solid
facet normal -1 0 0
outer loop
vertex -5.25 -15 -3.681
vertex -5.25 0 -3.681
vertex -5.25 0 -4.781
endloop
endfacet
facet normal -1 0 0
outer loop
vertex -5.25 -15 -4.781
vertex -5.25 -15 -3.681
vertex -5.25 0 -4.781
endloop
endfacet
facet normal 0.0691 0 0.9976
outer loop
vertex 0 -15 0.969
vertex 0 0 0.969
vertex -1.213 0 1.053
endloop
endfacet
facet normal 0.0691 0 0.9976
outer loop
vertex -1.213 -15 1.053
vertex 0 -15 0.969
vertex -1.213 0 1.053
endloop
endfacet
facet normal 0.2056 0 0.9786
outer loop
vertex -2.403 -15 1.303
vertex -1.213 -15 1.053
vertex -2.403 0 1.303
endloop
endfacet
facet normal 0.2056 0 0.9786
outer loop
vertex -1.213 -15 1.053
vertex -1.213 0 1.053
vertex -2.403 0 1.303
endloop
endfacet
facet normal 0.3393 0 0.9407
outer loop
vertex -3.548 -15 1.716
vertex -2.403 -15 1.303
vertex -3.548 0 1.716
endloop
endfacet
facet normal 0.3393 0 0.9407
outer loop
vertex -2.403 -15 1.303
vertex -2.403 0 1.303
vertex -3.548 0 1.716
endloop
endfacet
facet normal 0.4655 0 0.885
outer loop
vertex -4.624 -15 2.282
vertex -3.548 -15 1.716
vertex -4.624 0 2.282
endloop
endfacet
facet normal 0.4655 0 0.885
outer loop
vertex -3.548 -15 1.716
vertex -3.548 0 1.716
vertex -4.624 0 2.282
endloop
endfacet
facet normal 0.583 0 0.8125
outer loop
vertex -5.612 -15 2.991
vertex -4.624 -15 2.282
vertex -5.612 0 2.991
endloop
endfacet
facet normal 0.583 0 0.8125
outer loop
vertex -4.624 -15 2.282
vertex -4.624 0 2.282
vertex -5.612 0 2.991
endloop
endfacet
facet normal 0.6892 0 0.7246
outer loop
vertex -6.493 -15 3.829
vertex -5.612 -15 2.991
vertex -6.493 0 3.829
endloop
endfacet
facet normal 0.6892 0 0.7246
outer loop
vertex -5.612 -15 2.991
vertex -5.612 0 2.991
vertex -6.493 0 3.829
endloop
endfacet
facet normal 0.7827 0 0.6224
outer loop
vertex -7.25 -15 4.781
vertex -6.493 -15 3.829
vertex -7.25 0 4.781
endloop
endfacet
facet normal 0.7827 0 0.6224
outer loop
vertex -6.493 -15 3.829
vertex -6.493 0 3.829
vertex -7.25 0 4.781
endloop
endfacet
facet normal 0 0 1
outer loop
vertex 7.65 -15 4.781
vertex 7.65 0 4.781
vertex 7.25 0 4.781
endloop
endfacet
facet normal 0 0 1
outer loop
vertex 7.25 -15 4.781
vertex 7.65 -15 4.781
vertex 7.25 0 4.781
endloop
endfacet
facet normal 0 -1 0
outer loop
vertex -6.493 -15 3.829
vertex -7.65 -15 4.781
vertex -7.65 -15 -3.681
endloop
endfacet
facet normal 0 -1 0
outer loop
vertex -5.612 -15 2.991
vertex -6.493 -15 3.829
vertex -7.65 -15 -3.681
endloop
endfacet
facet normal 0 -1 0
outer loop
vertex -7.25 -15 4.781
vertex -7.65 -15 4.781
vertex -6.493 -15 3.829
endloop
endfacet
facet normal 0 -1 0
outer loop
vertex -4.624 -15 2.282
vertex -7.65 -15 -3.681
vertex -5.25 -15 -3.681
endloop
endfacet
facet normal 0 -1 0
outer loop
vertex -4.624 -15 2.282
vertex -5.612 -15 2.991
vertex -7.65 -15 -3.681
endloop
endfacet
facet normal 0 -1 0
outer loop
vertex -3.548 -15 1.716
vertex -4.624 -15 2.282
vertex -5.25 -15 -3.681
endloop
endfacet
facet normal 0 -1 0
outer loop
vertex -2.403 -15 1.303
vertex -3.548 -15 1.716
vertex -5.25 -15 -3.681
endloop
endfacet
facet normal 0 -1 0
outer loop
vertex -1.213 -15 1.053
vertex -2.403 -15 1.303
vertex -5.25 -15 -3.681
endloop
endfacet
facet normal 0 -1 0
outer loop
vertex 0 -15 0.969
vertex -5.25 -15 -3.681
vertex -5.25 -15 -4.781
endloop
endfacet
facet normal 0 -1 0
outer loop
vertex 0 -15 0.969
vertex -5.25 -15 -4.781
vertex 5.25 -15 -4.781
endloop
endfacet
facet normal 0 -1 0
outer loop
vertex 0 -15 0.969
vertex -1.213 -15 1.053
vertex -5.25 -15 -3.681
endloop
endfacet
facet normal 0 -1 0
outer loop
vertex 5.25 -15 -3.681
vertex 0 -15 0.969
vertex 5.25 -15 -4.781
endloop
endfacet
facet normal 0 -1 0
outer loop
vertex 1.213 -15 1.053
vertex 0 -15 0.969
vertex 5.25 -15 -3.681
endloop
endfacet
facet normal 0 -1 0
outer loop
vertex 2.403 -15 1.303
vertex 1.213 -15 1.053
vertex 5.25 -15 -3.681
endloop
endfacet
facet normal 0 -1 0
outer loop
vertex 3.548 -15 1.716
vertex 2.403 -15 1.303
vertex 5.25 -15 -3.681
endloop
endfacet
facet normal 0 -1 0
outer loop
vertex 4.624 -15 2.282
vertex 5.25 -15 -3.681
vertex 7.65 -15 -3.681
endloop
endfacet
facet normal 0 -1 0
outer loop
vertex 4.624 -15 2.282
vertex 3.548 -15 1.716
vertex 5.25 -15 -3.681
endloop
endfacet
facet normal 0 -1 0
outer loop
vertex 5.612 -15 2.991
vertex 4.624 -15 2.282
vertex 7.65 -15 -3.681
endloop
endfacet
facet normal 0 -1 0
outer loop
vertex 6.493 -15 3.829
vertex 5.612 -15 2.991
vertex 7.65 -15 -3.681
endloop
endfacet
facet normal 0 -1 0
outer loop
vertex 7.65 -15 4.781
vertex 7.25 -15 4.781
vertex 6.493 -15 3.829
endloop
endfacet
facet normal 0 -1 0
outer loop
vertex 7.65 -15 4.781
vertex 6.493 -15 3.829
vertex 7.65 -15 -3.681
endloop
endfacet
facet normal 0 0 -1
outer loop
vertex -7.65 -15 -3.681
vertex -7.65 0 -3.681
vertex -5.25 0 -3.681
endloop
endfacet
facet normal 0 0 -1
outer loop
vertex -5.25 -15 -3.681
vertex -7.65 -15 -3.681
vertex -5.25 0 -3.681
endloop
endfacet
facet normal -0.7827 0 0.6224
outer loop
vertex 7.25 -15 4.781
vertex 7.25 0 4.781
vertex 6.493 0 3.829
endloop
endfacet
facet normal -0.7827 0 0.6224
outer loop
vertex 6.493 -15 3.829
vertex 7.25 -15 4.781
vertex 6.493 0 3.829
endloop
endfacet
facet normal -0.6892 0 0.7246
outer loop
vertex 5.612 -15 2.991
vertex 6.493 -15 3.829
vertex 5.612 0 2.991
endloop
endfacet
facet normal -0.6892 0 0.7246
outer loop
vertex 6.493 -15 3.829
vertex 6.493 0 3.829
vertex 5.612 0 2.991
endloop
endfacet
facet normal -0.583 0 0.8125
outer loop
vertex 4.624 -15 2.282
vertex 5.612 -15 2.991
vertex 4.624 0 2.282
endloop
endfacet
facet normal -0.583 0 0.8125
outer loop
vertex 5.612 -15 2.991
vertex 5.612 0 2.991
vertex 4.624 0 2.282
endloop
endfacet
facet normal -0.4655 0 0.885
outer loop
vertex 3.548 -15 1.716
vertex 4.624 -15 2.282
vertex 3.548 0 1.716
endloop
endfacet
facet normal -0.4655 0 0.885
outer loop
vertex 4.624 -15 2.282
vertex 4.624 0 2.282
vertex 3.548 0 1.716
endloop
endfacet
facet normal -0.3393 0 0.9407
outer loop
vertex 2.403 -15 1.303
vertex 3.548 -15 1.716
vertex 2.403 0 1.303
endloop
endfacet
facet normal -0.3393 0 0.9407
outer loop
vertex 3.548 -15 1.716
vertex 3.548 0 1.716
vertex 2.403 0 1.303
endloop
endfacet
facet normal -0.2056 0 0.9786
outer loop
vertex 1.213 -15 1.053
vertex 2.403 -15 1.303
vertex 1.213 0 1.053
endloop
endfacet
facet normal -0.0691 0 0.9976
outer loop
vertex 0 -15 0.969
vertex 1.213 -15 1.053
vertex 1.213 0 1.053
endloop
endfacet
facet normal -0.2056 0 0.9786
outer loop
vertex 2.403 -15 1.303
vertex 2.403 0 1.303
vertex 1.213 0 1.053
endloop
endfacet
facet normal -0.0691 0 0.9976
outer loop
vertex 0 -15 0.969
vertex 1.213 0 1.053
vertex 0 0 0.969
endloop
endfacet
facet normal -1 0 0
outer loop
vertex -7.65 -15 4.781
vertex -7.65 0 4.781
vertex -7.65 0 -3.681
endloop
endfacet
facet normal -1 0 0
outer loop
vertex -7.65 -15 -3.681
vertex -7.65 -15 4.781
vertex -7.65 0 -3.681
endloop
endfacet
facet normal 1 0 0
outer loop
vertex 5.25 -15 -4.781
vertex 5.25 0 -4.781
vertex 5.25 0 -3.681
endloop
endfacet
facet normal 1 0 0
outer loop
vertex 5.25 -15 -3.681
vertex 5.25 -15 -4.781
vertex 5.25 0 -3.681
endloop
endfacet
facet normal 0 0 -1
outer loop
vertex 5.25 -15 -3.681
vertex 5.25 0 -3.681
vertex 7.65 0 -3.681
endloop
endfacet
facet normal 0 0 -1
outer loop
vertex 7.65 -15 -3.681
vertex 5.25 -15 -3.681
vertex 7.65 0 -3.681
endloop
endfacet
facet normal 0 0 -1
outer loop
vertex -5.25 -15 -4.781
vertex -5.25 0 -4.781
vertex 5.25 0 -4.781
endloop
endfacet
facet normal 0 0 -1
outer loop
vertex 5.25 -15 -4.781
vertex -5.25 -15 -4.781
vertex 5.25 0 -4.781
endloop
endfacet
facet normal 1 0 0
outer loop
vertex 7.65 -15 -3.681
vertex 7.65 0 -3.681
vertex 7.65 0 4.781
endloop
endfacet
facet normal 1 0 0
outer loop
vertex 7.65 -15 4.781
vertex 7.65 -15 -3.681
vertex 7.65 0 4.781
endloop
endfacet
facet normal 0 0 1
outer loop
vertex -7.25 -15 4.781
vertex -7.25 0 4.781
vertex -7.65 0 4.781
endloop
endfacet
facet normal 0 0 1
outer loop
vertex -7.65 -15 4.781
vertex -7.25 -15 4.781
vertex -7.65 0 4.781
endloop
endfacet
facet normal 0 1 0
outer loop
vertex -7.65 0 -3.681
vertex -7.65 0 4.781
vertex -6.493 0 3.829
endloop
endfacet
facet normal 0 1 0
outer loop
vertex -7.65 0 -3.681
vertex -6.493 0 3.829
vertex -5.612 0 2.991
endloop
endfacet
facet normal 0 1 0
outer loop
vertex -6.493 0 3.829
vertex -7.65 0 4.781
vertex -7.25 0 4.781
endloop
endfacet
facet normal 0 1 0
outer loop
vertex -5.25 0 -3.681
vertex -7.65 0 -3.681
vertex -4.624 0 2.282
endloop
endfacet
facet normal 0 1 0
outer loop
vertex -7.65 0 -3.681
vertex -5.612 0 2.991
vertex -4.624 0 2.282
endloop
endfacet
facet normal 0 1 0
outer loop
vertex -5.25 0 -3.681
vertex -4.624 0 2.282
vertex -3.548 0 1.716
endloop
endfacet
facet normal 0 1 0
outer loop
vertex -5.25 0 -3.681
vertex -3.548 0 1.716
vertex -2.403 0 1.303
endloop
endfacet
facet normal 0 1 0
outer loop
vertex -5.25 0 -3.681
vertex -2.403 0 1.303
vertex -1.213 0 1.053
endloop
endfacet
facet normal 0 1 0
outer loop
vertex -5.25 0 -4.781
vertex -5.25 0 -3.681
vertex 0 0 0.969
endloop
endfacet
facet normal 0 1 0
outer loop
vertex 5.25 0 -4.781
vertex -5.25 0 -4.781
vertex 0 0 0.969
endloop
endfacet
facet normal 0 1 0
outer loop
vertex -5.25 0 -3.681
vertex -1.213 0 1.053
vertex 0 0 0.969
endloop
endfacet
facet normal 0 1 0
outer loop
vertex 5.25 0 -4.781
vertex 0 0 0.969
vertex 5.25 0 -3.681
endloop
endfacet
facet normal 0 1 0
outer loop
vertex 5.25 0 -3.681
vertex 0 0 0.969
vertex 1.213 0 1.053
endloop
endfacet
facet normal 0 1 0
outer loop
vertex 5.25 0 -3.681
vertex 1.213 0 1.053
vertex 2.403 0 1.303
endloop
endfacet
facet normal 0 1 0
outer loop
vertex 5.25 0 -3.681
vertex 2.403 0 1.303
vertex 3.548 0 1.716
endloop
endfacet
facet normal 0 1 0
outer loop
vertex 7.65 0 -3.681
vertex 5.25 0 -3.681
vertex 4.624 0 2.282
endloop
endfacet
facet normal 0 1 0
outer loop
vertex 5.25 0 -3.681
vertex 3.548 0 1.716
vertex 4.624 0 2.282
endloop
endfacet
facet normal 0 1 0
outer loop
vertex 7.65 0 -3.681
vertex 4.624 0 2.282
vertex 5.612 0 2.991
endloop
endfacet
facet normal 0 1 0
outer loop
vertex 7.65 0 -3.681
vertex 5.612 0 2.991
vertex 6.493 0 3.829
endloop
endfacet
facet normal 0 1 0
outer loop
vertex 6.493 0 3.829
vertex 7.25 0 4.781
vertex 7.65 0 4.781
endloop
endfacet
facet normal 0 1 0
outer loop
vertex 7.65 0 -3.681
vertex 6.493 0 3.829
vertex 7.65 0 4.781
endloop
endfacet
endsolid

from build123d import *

# Parameters (mm, degrees)
F1_DEPTH = 15


# Not quite as in the source:
# - ends of sketch curves that miss each other by under 0.0002 mm in the source are joined


with BuildPart() as f1:
    # F0 (on Front) → F1 (new body)
    with BuildSketch(Plane.XZ):
        with BuildLine():
            Line((7.65, 4.781237), (7.250144, 4.781237))
            ThreePointArc((7.250144, 4.781237), (4.0957152155, 1.9799825245), (0, 0.968764))
            ThreePointArc((0, 0.968764), (-4.0957149647, 1.9799823926), (-7.2501430423, 4.7812369709))
            Line((-7.2501430423, 4.7812369709), (-7.65, 4.781237))
            Line((-7.65, 4.781237), (-7.65, -3.681236))
            Line((-7.65, -3.681236), (-5.25, -3.681236))
            Line((-5.25, -3.681236), (-5.25, -4.781236))
            Line((-5.25, -4.781236), (0, -4.781236))
            Line((0, -4.781236), (5.25, -4.781236))
            Line((5.25, -4.781236), (5.25, -3.681236))
            Line((5.25, -3.681236), (7.65, -3.681236))
            Line((7.65, -3.681236), (7.65, 4.781237))
        make_face()
    extrude(amount=F1_DEPTH)


solid = f1.part
